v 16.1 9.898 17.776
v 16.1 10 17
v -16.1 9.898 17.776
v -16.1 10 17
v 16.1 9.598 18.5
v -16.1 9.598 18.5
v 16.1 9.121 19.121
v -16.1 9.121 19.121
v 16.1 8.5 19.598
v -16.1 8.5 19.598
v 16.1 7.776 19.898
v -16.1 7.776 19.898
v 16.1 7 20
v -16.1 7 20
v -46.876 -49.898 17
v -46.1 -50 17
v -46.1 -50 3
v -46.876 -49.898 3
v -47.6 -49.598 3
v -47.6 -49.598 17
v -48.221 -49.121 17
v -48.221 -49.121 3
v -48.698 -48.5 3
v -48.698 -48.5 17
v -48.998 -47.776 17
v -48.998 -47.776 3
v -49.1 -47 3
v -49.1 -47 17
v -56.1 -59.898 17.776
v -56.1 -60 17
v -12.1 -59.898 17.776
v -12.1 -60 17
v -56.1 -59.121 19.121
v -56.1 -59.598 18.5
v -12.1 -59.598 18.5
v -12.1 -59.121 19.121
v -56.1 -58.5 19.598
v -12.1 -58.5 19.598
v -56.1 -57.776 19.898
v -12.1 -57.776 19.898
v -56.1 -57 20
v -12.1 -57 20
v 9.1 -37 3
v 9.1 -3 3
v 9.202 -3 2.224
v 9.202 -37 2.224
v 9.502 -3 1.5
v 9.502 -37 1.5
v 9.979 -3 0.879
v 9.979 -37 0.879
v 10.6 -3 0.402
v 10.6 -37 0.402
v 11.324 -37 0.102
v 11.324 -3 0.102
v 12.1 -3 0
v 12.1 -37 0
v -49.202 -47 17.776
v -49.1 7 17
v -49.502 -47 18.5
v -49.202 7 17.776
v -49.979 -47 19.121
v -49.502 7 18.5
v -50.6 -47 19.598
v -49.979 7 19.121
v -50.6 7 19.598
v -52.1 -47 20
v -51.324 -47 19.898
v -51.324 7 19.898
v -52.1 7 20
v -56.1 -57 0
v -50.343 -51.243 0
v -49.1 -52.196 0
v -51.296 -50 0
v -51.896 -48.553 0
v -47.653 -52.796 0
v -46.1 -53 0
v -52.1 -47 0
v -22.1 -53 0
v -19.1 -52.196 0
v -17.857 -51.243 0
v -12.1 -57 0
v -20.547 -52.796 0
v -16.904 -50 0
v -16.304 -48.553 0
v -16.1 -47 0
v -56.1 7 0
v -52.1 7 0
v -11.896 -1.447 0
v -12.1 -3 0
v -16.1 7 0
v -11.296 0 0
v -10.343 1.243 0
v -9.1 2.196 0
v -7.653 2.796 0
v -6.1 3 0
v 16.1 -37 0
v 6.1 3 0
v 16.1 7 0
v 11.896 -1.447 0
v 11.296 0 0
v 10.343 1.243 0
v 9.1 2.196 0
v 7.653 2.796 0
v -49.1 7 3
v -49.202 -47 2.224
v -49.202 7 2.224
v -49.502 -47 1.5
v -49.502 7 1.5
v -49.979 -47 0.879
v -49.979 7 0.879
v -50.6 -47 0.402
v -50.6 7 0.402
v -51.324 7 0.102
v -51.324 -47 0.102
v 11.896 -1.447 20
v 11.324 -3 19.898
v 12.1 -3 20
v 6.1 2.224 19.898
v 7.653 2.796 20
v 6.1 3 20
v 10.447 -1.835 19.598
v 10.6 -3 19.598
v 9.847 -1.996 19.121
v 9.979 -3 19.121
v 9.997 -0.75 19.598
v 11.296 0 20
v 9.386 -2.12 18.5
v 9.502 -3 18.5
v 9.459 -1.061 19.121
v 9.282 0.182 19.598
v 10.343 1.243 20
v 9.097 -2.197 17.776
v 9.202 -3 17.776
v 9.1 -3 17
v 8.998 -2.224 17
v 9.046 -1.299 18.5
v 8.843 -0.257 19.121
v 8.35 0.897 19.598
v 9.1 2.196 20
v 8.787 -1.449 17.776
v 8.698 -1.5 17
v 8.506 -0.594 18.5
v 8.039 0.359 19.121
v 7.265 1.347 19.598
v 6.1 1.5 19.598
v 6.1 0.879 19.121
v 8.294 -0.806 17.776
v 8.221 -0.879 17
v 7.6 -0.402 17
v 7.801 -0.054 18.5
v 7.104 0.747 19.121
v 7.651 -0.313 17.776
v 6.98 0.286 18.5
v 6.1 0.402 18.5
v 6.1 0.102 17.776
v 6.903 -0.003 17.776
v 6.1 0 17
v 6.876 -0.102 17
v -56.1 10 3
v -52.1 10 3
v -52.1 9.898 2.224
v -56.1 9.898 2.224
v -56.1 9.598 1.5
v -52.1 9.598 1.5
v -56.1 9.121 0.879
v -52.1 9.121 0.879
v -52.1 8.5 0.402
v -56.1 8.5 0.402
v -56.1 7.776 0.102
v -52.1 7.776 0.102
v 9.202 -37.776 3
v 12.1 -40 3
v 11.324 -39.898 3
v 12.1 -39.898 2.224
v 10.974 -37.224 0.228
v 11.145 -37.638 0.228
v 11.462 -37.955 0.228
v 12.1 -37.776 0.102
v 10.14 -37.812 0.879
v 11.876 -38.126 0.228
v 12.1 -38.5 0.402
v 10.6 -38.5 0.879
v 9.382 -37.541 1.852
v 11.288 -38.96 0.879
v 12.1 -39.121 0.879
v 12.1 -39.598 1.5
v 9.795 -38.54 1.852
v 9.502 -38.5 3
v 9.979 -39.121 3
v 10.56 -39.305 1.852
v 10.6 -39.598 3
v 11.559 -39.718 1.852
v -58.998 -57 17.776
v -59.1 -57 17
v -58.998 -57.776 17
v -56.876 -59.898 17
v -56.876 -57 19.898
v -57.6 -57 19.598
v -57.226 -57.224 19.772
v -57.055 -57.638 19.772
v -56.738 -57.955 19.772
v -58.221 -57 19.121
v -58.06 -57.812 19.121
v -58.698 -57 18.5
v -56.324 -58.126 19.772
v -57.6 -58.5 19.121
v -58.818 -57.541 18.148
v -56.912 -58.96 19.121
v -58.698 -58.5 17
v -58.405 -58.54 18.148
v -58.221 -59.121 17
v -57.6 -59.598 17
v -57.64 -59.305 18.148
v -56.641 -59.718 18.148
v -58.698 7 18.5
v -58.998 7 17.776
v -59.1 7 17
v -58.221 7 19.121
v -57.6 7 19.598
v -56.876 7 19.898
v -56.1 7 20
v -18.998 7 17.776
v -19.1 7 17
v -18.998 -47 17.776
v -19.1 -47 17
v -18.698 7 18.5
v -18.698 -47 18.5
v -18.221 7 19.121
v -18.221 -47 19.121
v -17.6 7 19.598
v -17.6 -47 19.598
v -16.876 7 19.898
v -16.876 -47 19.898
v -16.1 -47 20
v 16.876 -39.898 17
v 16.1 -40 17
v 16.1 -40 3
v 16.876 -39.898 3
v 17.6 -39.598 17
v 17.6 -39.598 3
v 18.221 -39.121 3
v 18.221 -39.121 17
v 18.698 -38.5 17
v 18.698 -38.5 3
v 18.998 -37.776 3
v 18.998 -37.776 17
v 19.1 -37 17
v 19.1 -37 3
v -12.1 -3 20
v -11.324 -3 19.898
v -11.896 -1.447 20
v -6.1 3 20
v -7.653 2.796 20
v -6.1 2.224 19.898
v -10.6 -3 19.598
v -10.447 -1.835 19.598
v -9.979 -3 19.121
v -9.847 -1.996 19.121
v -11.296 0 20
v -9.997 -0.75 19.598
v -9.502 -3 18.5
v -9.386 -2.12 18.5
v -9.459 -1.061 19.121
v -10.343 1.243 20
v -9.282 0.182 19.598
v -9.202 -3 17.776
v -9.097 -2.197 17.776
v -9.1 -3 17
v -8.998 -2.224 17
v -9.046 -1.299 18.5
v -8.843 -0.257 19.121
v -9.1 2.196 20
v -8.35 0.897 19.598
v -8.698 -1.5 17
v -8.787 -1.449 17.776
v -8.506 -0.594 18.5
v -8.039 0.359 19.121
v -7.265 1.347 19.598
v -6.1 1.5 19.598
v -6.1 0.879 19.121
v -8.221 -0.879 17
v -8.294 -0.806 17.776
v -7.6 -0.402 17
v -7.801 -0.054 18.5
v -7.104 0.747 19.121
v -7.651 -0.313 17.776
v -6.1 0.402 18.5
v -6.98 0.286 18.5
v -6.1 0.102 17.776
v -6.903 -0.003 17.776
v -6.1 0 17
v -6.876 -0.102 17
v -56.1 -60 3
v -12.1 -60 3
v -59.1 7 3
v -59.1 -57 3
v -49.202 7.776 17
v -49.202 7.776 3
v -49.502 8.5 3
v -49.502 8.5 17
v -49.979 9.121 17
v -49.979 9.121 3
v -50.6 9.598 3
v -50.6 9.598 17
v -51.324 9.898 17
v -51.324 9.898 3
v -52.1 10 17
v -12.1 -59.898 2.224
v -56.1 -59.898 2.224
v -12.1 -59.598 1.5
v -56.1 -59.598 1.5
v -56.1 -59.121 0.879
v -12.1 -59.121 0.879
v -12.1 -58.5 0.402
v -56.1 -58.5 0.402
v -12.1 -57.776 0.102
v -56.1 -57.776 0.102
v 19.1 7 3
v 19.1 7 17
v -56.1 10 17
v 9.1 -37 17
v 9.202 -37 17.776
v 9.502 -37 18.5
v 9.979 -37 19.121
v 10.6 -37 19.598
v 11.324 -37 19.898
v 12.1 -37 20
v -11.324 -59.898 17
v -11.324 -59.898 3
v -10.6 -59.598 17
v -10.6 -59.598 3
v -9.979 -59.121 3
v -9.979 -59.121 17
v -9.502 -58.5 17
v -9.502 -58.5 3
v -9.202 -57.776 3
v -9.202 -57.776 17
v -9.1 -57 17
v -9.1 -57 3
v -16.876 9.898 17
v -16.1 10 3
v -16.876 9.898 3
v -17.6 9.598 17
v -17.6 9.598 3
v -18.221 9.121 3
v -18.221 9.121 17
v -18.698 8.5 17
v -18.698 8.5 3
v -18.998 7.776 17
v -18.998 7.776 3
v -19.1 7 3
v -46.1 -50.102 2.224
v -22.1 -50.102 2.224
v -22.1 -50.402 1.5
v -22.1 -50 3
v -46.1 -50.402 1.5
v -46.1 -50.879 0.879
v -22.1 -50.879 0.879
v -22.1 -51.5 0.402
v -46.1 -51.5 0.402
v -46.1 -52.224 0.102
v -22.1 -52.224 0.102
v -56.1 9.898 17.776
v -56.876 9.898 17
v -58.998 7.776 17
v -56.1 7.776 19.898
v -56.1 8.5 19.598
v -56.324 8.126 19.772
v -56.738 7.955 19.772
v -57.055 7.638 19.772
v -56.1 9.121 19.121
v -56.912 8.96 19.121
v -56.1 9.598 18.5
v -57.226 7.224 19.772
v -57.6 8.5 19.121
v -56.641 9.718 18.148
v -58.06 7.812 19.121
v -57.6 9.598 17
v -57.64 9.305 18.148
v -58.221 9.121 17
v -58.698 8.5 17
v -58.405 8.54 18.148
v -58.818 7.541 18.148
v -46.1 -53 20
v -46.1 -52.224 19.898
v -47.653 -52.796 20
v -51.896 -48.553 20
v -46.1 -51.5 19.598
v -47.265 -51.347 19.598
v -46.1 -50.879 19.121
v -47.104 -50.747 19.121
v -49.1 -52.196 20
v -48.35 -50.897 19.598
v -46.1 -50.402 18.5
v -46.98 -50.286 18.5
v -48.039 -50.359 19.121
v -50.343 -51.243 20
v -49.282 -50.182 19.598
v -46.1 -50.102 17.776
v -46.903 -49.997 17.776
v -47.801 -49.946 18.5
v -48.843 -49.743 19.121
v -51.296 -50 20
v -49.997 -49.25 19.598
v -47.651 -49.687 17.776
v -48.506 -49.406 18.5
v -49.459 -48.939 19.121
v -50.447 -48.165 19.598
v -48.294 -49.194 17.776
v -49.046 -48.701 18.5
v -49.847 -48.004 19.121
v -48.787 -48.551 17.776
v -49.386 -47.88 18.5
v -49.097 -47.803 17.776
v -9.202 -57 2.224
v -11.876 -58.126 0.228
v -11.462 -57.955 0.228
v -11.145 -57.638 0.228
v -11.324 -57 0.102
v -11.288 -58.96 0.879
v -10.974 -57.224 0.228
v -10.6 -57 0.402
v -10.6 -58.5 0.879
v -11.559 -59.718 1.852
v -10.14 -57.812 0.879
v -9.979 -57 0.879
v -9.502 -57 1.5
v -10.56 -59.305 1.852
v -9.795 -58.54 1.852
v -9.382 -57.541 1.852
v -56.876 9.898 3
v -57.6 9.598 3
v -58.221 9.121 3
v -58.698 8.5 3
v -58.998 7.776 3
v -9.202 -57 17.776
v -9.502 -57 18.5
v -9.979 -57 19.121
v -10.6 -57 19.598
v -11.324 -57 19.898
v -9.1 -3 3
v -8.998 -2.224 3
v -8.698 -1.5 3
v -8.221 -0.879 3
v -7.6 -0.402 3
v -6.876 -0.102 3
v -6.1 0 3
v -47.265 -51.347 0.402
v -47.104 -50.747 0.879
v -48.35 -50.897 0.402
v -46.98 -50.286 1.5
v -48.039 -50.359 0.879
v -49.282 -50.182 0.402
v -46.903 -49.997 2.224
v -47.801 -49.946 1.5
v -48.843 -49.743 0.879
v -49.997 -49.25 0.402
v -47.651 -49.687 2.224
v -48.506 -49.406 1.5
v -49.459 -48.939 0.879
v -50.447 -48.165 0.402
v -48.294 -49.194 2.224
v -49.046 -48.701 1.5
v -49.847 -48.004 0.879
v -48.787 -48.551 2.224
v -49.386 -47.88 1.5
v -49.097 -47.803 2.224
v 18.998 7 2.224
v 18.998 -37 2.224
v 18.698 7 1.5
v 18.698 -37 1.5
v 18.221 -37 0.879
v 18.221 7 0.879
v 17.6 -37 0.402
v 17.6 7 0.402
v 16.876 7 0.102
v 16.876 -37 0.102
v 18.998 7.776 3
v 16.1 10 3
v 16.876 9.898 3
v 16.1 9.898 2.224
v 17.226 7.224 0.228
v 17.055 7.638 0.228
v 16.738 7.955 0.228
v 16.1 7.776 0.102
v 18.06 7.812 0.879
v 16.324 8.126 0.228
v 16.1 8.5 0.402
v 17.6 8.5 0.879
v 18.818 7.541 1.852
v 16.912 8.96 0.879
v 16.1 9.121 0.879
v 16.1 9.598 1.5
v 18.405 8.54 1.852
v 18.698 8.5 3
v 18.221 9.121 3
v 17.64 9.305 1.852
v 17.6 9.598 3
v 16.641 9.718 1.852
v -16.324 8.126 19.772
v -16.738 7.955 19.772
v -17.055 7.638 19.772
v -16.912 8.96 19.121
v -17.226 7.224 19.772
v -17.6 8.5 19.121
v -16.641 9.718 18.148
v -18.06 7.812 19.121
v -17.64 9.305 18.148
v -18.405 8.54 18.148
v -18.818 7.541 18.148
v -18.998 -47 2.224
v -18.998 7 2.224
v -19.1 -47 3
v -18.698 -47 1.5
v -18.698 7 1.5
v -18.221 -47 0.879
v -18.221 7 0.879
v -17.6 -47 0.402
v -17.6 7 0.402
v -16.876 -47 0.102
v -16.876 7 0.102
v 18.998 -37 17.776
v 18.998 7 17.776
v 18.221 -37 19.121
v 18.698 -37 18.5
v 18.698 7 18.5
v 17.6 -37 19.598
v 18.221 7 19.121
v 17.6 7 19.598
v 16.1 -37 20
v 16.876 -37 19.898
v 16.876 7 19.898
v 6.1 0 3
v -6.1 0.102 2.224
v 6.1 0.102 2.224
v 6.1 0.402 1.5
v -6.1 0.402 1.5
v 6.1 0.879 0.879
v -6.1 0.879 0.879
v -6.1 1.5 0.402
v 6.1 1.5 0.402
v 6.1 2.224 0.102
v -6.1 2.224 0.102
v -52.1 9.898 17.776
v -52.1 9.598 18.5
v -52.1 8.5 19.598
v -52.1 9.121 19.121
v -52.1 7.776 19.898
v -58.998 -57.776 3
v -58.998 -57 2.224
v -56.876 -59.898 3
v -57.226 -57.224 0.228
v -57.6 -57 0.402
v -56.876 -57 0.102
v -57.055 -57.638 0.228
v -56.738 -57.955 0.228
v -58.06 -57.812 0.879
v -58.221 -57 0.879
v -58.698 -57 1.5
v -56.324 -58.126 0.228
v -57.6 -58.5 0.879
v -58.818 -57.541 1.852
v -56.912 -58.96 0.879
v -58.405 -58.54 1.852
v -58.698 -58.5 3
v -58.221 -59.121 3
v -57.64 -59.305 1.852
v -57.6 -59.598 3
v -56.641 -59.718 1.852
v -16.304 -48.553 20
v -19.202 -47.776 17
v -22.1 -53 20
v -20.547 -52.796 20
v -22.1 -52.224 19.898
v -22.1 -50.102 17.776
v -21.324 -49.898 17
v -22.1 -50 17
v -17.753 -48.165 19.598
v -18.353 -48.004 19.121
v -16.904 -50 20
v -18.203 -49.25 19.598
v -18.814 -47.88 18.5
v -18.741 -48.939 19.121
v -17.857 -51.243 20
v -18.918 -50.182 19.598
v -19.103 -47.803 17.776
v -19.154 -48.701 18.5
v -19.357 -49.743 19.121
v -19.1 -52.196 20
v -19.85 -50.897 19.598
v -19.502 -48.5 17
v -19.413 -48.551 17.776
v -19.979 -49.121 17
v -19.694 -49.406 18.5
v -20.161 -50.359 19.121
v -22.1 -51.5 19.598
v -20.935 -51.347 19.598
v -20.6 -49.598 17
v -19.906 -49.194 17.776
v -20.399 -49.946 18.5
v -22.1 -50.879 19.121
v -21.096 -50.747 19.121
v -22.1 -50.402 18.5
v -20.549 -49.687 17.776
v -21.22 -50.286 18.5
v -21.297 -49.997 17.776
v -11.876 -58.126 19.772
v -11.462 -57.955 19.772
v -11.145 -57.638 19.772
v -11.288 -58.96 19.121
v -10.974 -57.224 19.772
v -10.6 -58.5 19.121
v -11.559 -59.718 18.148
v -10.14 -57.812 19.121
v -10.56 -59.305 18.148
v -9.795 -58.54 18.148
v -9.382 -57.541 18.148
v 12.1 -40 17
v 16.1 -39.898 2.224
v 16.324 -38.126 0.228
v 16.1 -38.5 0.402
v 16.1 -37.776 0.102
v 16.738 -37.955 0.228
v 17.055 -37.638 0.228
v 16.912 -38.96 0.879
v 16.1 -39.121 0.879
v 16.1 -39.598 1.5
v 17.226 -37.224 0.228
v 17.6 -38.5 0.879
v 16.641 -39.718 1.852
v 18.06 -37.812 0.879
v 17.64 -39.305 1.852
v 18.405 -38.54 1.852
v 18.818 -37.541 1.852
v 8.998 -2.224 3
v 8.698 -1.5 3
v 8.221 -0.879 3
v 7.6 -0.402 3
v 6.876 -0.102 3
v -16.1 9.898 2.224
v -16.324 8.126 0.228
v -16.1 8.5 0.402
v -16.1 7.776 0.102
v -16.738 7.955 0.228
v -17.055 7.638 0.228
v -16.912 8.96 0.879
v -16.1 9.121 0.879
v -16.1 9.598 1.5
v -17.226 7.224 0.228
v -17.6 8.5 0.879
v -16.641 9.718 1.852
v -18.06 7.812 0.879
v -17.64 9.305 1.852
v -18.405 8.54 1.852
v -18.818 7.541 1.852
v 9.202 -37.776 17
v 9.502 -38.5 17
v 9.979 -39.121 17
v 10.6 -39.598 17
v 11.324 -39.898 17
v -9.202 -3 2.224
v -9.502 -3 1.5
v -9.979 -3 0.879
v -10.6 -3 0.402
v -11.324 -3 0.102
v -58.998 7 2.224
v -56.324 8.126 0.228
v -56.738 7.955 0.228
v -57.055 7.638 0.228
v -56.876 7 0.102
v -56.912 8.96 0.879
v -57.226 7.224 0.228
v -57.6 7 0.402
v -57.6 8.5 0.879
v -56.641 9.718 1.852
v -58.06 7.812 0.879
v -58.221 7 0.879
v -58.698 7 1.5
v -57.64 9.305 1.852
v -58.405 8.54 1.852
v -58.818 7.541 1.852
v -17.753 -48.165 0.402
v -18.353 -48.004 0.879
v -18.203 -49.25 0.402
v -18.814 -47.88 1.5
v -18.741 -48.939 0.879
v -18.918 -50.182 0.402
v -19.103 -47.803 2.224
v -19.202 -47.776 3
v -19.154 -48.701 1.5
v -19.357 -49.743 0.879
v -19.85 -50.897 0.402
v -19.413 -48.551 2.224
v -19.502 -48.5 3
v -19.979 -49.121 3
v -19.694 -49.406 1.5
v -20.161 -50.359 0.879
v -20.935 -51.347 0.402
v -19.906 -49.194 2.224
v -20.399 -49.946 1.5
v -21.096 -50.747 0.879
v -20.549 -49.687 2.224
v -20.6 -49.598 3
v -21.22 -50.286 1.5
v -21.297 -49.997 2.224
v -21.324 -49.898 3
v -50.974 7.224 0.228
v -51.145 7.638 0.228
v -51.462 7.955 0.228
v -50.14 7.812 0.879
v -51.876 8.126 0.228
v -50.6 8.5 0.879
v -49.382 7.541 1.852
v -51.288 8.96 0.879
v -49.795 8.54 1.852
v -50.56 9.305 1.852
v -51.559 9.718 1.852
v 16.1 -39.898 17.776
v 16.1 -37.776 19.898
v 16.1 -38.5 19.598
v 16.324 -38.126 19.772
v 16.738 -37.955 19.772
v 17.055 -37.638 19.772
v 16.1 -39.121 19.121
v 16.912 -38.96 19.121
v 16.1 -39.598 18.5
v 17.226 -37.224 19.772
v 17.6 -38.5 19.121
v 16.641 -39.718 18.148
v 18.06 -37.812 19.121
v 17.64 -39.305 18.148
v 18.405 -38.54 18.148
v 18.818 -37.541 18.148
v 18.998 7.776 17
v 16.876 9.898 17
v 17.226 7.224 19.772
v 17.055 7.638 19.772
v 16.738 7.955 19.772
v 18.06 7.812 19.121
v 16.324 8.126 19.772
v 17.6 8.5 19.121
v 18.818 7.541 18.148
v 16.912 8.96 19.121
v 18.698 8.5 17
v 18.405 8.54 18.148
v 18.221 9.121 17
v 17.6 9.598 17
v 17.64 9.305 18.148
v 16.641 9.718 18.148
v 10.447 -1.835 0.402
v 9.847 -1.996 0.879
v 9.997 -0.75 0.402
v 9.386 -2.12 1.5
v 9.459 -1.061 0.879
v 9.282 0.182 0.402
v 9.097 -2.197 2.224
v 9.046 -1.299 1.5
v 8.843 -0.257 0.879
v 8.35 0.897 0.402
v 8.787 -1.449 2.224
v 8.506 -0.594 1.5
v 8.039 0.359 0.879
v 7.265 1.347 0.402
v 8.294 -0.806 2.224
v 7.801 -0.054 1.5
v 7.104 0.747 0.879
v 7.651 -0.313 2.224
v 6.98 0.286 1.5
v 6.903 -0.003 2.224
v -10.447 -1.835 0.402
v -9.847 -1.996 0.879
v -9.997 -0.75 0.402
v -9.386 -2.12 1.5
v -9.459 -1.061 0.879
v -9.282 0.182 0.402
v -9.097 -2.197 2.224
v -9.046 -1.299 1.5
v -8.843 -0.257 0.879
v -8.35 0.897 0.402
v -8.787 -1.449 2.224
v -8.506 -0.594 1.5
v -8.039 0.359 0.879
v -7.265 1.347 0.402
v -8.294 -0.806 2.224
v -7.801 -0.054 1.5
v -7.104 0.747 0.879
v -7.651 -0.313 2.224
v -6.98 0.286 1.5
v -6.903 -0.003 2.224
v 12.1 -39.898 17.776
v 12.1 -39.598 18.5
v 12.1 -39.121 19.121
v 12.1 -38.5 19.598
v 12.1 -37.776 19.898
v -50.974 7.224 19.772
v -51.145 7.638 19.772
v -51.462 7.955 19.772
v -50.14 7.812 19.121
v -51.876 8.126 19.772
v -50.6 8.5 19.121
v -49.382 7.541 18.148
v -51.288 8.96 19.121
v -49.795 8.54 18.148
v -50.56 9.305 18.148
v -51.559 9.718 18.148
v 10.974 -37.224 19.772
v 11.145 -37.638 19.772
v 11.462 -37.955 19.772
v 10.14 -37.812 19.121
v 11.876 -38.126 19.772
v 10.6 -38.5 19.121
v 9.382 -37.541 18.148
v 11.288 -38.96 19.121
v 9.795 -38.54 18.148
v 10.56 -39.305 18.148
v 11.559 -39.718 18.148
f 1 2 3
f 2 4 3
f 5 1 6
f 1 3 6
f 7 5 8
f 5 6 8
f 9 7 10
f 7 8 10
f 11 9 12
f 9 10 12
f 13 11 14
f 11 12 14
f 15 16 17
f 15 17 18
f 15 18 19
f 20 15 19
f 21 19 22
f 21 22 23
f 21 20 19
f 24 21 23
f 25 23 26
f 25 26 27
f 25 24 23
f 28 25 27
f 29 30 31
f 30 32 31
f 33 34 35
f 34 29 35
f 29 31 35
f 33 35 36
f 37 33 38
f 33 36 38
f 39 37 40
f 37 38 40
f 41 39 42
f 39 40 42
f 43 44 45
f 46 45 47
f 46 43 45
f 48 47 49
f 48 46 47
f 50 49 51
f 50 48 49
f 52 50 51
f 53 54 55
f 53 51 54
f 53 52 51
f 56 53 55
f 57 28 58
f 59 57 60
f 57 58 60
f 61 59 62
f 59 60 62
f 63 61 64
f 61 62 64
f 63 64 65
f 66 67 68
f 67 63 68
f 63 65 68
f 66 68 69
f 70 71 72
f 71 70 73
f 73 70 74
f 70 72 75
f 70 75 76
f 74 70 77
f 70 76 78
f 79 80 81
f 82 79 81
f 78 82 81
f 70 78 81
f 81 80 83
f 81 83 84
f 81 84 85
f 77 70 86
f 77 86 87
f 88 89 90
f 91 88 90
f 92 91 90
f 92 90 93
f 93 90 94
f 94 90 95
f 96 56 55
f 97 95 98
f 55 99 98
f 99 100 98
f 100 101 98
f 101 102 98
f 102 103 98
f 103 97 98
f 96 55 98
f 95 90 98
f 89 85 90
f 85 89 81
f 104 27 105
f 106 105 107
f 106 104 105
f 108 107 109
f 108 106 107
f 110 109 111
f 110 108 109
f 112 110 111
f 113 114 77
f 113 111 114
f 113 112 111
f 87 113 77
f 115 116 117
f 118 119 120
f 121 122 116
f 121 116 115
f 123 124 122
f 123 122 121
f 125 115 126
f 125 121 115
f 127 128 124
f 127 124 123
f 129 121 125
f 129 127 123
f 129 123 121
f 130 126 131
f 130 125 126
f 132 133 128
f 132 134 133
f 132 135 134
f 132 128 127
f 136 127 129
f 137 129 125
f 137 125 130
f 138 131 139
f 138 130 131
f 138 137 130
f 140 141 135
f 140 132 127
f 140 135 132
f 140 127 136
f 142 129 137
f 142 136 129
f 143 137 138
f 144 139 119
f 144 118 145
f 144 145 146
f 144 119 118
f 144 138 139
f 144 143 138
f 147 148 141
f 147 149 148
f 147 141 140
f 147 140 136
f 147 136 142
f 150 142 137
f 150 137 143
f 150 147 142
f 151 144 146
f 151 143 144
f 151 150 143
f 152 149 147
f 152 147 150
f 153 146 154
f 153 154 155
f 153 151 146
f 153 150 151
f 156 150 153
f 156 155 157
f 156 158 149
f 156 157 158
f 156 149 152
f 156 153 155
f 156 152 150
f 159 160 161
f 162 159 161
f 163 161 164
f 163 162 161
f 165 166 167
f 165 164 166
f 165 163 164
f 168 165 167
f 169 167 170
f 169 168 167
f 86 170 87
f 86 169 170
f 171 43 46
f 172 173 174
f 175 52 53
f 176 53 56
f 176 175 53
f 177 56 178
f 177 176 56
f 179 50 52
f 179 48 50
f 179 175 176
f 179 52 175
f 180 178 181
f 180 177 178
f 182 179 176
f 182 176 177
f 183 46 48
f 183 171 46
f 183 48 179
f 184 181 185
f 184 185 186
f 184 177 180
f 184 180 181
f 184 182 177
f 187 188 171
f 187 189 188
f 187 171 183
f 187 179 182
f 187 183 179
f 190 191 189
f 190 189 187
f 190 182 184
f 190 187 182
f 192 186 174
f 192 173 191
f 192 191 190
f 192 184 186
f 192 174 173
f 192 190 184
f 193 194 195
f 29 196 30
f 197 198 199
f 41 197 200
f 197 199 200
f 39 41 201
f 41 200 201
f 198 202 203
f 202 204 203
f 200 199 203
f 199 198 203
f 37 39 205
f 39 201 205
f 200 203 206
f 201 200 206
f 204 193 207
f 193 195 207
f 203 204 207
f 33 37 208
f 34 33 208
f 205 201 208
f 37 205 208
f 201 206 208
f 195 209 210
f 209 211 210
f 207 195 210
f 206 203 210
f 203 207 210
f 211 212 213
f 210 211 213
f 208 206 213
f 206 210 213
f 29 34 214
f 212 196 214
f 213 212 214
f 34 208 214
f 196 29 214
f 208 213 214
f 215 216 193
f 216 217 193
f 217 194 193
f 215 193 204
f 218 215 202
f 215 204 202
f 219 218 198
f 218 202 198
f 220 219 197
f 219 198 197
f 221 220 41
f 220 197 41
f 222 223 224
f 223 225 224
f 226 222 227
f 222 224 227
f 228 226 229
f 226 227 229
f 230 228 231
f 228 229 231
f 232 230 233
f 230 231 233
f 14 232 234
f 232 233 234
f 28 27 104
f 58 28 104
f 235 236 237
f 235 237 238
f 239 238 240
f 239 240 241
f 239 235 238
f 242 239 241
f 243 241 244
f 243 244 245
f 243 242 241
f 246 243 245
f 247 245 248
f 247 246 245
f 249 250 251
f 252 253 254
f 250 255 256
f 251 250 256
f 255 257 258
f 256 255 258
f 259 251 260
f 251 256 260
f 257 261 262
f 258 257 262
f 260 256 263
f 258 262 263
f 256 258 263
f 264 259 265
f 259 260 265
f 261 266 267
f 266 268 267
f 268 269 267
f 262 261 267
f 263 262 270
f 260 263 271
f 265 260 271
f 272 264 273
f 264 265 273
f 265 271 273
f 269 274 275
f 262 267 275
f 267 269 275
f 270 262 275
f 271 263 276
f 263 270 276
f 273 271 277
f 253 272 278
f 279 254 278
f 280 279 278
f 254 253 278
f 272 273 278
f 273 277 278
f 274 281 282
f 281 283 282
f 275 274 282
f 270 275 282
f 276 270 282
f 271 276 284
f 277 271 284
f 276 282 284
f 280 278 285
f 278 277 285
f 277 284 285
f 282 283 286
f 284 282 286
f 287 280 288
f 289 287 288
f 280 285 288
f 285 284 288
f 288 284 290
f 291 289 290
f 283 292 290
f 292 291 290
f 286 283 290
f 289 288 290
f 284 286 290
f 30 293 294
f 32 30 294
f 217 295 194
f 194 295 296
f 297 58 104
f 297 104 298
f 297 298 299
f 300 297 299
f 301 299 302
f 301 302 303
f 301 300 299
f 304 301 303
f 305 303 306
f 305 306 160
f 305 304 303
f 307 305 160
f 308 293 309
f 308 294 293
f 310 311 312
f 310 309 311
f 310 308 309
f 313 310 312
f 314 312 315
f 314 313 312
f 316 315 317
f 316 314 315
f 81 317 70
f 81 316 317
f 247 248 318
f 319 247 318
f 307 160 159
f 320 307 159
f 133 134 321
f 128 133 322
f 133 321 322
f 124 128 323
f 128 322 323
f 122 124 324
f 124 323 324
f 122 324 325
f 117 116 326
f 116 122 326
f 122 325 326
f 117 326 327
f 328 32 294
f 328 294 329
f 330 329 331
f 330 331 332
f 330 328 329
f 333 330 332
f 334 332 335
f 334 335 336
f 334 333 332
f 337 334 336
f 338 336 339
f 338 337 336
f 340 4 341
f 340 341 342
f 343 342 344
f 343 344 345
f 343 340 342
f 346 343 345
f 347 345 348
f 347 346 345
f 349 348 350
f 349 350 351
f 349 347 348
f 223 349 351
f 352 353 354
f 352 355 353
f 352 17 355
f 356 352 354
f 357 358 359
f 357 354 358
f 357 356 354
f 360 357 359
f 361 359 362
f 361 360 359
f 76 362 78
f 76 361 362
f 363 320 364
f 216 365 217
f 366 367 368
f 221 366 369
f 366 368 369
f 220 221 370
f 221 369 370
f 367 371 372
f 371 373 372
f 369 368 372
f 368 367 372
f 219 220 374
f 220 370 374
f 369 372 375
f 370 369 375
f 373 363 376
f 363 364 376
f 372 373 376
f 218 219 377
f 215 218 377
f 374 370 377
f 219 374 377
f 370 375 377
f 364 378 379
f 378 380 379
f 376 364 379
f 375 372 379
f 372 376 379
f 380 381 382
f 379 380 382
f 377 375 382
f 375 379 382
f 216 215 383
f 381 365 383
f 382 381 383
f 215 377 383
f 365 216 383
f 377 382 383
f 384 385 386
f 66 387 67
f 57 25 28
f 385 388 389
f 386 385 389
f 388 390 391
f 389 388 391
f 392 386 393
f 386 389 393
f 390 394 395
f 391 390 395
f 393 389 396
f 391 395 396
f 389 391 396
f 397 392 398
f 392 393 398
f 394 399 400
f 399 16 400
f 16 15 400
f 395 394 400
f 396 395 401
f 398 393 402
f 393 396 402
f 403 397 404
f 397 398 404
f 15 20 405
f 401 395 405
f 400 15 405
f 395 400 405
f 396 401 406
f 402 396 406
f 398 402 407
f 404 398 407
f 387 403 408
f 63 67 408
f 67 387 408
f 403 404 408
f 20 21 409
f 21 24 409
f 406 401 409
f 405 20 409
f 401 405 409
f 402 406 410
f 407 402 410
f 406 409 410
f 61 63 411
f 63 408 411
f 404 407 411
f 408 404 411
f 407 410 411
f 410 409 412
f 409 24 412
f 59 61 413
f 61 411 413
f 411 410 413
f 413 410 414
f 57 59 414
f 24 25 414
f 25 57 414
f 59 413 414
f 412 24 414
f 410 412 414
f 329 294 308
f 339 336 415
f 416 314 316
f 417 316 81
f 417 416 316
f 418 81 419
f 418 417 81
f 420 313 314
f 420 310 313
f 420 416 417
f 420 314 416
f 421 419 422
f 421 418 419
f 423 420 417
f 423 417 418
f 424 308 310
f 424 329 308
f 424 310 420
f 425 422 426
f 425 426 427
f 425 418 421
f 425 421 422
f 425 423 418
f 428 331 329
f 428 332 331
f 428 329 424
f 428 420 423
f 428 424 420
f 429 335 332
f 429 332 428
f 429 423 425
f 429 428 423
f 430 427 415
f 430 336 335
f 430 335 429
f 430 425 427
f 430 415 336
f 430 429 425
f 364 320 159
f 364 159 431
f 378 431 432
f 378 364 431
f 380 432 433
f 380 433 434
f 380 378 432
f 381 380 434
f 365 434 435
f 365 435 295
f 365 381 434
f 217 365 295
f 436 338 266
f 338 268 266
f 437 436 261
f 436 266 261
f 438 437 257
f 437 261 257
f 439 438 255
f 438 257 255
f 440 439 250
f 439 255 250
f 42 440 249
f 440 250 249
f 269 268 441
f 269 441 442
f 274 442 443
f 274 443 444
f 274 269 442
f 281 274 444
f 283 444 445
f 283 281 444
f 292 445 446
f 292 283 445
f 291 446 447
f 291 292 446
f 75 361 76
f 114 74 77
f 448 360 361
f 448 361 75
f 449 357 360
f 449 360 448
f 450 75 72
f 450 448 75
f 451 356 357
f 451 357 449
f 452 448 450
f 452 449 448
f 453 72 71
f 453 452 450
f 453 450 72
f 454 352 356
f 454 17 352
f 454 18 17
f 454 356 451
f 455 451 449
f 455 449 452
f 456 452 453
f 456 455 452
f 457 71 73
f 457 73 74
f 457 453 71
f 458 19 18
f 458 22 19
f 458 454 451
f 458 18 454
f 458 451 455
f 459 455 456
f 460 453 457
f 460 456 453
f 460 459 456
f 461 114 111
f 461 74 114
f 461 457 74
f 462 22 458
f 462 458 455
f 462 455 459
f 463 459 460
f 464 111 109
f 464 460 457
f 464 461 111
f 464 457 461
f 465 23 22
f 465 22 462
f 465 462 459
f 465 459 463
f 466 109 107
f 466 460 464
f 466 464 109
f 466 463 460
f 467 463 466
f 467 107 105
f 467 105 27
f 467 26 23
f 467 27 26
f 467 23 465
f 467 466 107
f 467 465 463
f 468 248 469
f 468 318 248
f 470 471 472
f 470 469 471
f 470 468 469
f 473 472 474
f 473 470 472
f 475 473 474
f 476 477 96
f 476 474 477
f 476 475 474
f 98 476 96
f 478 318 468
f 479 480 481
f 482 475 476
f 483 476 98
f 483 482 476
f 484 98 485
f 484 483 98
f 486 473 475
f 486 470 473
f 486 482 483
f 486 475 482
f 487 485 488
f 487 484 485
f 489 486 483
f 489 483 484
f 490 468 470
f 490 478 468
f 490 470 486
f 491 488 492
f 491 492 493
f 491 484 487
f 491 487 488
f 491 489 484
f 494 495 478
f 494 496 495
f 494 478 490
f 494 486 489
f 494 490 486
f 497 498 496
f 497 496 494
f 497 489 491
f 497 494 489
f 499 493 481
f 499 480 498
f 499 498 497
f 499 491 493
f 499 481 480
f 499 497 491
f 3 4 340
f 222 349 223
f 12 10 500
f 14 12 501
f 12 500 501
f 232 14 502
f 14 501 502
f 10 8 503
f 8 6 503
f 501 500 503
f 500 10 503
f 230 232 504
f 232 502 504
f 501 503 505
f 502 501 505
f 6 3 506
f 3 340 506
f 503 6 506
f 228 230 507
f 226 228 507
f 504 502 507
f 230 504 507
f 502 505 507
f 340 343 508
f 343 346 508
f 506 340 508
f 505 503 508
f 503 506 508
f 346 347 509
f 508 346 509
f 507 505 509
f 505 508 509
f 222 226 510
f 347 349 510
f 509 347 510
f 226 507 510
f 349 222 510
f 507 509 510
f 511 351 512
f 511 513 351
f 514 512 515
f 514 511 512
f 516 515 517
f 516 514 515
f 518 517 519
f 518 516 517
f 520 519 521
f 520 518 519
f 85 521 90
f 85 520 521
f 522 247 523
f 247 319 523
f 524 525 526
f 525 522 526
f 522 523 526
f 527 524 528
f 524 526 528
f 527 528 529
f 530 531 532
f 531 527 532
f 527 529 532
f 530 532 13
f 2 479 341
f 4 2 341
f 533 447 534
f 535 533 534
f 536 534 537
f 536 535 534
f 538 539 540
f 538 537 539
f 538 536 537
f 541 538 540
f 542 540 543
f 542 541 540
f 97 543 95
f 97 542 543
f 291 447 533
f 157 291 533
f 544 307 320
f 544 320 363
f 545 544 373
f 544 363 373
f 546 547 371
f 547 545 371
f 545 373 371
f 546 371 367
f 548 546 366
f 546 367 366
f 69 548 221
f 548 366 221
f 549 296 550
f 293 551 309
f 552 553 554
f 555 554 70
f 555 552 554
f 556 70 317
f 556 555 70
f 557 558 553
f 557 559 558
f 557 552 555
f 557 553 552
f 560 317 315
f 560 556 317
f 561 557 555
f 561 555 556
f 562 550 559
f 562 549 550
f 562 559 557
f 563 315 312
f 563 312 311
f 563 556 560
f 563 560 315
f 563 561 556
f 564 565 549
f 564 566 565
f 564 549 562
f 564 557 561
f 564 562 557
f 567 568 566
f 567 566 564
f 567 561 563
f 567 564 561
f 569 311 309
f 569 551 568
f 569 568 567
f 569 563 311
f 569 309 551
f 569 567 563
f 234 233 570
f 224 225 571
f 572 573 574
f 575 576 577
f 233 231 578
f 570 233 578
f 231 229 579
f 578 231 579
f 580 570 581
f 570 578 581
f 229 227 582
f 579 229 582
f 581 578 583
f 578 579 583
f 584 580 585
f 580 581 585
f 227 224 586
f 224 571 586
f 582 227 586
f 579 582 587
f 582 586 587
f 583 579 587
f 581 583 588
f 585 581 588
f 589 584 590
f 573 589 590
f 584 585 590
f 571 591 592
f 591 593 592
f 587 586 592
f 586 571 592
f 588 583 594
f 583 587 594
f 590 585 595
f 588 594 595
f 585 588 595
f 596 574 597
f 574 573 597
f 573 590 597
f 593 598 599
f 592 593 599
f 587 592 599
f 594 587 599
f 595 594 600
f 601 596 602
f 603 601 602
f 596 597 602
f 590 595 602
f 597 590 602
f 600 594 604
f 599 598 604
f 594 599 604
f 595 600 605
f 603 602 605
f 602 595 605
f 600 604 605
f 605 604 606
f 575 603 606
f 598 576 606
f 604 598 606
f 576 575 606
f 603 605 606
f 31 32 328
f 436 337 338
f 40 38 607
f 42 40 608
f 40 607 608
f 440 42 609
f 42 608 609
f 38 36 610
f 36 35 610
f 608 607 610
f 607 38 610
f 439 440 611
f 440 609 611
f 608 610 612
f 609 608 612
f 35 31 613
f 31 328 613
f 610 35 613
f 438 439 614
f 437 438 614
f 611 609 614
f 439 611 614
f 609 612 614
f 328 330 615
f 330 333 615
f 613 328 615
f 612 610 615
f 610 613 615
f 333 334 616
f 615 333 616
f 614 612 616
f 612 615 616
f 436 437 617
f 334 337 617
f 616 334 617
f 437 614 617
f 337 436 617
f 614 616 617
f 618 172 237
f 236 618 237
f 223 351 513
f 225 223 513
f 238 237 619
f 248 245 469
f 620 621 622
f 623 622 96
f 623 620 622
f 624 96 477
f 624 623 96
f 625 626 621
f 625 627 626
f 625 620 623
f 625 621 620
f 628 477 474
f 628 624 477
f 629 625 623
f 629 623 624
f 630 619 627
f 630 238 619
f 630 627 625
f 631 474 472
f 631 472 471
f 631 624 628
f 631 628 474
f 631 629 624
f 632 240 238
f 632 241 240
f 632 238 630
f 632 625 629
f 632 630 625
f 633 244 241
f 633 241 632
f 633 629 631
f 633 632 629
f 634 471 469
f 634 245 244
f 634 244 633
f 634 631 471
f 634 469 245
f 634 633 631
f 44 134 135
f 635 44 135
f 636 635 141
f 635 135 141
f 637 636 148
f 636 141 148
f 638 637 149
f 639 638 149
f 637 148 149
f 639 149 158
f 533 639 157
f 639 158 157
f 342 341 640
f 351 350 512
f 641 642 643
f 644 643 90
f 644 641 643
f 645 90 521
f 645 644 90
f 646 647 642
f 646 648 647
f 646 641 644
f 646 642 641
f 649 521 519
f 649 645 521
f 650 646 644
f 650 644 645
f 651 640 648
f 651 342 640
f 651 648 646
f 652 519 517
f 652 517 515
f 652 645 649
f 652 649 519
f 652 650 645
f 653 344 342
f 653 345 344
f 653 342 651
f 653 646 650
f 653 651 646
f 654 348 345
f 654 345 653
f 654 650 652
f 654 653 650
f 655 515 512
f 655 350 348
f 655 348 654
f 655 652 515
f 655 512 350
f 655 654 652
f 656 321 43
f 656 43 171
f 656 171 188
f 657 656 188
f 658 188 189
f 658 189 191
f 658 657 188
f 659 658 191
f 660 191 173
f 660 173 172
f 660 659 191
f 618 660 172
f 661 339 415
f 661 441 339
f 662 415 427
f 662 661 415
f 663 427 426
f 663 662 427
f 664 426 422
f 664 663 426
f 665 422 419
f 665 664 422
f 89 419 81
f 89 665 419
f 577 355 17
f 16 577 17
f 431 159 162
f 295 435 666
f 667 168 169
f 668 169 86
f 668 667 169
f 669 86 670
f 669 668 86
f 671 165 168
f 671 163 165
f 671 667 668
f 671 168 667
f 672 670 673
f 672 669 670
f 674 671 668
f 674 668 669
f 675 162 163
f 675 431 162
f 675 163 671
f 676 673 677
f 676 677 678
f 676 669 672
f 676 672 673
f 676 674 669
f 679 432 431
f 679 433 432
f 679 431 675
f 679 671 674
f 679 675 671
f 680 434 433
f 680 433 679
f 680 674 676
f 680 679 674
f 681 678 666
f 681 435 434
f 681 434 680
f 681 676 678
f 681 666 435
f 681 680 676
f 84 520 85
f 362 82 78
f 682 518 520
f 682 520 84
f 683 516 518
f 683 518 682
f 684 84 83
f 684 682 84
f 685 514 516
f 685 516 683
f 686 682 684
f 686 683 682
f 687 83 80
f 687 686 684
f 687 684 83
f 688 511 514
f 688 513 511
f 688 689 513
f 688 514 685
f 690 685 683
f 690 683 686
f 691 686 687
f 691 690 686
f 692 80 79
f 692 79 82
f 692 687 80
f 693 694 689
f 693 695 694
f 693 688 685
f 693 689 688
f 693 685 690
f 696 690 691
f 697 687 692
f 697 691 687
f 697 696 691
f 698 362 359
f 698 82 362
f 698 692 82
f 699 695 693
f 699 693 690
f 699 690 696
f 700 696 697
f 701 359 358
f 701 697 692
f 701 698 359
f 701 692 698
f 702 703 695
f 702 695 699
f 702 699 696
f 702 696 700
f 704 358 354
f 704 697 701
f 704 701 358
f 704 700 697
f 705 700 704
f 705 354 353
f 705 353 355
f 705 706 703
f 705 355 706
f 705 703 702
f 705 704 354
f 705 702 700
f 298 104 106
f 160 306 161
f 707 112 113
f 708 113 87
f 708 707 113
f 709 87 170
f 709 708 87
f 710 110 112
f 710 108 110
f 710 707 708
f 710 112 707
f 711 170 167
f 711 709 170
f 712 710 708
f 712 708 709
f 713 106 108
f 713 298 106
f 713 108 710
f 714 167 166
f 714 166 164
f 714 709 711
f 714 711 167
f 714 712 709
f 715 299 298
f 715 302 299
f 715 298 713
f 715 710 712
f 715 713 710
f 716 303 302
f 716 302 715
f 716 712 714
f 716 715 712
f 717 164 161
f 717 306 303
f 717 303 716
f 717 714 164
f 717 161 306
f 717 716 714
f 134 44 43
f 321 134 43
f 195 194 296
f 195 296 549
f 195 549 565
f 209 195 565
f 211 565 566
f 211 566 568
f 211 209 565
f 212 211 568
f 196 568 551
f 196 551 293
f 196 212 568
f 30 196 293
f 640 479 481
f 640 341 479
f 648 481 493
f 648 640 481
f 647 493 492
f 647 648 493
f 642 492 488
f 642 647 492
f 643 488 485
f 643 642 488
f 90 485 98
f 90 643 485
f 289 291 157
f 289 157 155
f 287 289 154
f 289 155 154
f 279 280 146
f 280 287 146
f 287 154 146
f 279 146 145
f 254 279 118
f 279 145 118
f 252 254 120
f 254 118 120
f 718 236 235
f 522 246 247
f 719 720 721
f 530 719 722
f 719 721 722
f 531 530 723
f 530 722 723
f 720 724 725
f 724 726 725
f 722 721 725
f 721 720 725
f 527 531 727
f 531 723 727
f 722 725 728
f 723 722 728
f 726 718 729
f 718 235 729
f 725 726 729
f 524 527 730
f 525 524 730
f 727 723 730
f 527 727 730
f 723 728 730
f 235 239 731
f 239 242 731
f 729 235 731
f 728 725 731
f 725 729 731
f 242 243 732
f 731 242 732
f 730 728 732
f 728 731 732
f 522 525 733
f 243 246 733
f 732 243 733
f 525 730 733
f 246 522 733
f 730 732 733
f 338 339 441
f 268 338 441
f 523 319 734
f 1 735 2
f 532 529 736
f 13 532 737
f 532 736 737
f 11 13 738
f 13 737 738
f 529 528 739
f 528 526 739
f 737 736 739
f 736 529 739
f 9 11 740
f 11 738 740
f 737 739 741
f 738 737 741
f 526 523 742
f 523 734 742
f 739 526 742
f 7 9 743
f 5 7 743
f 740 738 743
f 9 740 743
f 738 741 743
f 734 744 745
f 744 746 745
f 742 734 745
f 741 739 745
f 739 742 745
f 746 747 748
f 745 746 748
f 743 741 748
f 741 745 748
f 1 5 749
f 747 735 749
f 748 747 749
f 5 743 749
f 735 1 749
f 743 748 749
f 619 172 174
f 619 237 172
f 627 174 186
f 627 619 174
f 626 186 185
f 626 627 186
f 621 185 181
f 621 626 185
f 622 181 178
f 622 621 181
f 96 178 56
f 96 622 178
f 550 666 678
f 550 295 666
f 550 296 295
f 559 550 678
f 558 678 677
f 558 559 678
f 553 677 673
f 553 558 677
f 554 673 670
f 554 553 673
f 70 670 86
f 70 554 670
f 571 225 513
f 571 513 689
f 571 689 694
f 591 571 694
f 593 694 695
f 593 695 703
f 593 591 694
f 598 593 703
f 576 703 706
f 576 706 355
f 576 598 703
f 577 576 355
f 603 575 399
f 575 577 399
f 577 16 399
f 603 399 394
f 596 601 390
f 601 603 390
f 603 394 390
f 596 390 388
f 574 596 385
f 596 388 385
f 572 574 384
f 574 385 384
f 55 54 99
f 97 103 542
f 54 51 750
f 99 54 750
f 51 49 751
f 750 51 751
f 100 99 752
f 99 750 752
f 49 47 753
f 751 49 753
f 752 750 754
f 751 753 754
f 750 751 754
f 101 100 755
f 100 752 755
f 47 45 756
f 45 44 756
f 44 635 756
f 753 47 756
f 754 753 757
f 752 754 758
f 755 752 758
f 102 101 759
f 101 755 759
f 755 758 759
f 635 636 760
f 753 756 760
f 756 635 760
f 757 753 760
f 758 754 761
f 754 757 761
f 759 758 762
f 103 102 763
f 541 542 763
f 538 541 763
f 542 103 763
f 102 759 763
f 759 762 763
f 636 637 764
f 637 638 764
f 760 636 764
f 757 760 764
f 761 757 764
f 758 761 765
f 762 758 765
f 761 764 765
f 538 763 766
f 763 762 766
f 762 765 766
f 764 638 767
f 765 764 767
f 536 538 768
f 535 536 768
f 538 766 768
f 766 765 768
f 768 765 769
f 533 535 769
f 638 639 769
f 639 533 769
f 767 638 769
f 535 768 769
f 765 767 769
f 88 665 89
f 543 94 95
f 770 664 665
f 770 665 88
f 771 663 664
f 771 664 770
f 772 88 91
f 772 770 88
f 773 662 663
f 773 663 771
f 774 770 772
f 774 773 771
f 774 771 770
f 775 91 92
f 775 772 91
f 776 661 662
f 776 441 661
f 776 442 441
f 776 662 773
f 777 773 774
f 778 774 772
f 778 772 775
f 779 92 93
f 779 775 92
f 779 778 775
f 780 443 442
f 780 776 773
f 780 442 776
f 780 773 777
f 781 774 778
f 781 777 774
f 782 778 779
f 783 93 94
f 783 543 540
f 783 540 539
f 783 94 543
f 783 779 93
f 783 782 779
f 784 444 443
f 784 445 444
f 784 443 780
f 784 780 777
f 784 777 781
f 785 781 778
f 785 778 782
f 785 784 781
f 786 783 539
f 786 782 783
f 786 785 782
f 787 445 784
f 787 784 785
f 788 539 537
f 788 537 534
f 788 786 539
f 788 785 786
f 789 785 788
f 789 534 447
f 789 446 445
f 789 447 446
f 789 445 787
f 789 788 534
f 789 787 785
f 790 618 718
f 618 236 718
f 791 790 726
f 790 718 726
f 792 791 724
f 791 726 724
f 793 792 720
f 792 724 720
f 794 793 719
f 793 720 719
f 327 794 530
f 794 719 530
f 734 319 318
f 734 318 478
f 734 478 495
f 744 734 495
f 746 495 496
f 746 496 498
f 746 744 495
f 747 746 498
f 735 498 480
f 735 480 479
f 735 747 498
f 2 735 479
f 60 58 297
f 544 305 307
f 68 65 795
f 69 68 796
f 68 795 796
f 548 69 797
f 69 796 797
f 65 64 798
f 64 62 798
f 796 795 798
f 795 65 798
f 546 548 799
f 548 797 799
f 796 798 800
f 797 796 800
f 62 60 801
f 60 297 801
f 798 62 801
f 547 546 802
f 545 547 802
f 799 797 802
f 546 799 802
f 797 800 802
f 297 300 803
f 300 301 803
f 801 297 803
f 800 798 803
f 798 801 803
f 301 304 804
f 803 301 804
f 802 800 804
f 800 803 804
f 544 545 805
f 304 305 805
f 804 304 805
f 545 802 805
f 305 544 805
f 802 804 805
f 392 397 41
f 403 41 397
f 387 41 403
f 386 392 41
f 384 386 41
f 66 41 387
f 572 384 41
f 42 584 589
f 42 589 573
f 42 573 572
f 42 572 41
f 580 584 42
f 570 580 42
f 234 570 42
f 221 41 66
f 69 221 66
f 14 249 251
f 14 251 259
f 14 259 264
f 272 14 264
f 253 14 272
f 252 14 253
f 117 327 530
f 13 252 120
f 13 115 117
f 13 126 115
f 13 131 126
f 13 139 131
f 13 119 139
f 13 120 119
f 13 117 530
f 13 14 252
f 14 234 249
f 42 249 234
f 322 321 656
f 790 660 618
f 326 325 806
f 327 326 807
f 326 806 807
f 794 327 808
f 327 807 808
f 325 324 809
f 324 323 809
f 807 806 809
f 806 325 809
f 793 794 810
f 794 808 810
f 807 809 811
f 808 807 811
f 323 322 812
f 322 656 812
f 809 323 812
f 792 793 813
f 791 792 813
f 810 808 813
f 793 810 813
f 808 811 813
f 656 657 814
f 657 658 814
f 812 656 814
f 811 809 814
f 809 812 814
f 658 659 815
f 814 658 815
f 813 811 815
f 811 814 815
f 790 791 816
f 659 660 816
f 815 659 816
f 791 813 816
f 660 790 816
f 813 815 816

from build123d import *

# Parameters (mm, degrees)
PAD_DEPTH = 20
FILLET_R  = 3


with BuildPart() as part:
    # Sketch → Pad (new body)
    with BuildSketch(Plane.XY):
        Polygon((9.1, 0), (9.1, -40), (19.1, -40), (19.1, 10), (-19.1, 10), (-19.1, -50), (-49.1, -50), (-49.1, 10), (-59.1, 10), (-59.1, -60), (-9.1, -60), (-9.1, 0), align=None)
    extrude(amount=PAD_DEPTH)

    # Fillet
    fillet_edges = [part.edges().sort_by_distance(p)[0] for p in [
        (9.1, 0, 10),
        (9.1, -40, 10),
        (9.1, -20, 0),
        (9.1, -20, 20),
        (19.1, -40, 10),
        (14.1, -40, 0),
        (14.1, -40, 20),
        (19.1, 10, 10),
        (19.1, -15, 0),
        (19.1, -15, 20),
        (-19.1, 10, 10),
        (0, 10, 0),
        (0, 10, 20),
        (-19.1, -50, 10),
        (-19.1, -20, 0),
        (-19.1, -20, 20),
        (-49.1, -50, 10),
        (-34.1, -50, 0),
        (-34.1, -50, 20),
        (-49.1, 10, 10),
        (-49.1, -20, 0),
        (-49.1, -20, 20),
        (-59.1, 10, 10),
        (-54.1, 10, 0),
        (-54.1, 10, 20),
        (-59.1, -60, 10),
        (-59.1, -25, 0),
        (-59.1, -25, 20),
        (-9.1, -60, 10),
        (-34.1, -60, 0),
        (-34.1, -60, 20),
        (-9.1, 0, 10),
        (-9.1, -30, 0),
        (-9.1, -30, 20),
        (0, 0, 0),
        (0, 0, 20),
    ]]
    fillet(fillet_edges, radius=FILLET_R)


solid = part.part
